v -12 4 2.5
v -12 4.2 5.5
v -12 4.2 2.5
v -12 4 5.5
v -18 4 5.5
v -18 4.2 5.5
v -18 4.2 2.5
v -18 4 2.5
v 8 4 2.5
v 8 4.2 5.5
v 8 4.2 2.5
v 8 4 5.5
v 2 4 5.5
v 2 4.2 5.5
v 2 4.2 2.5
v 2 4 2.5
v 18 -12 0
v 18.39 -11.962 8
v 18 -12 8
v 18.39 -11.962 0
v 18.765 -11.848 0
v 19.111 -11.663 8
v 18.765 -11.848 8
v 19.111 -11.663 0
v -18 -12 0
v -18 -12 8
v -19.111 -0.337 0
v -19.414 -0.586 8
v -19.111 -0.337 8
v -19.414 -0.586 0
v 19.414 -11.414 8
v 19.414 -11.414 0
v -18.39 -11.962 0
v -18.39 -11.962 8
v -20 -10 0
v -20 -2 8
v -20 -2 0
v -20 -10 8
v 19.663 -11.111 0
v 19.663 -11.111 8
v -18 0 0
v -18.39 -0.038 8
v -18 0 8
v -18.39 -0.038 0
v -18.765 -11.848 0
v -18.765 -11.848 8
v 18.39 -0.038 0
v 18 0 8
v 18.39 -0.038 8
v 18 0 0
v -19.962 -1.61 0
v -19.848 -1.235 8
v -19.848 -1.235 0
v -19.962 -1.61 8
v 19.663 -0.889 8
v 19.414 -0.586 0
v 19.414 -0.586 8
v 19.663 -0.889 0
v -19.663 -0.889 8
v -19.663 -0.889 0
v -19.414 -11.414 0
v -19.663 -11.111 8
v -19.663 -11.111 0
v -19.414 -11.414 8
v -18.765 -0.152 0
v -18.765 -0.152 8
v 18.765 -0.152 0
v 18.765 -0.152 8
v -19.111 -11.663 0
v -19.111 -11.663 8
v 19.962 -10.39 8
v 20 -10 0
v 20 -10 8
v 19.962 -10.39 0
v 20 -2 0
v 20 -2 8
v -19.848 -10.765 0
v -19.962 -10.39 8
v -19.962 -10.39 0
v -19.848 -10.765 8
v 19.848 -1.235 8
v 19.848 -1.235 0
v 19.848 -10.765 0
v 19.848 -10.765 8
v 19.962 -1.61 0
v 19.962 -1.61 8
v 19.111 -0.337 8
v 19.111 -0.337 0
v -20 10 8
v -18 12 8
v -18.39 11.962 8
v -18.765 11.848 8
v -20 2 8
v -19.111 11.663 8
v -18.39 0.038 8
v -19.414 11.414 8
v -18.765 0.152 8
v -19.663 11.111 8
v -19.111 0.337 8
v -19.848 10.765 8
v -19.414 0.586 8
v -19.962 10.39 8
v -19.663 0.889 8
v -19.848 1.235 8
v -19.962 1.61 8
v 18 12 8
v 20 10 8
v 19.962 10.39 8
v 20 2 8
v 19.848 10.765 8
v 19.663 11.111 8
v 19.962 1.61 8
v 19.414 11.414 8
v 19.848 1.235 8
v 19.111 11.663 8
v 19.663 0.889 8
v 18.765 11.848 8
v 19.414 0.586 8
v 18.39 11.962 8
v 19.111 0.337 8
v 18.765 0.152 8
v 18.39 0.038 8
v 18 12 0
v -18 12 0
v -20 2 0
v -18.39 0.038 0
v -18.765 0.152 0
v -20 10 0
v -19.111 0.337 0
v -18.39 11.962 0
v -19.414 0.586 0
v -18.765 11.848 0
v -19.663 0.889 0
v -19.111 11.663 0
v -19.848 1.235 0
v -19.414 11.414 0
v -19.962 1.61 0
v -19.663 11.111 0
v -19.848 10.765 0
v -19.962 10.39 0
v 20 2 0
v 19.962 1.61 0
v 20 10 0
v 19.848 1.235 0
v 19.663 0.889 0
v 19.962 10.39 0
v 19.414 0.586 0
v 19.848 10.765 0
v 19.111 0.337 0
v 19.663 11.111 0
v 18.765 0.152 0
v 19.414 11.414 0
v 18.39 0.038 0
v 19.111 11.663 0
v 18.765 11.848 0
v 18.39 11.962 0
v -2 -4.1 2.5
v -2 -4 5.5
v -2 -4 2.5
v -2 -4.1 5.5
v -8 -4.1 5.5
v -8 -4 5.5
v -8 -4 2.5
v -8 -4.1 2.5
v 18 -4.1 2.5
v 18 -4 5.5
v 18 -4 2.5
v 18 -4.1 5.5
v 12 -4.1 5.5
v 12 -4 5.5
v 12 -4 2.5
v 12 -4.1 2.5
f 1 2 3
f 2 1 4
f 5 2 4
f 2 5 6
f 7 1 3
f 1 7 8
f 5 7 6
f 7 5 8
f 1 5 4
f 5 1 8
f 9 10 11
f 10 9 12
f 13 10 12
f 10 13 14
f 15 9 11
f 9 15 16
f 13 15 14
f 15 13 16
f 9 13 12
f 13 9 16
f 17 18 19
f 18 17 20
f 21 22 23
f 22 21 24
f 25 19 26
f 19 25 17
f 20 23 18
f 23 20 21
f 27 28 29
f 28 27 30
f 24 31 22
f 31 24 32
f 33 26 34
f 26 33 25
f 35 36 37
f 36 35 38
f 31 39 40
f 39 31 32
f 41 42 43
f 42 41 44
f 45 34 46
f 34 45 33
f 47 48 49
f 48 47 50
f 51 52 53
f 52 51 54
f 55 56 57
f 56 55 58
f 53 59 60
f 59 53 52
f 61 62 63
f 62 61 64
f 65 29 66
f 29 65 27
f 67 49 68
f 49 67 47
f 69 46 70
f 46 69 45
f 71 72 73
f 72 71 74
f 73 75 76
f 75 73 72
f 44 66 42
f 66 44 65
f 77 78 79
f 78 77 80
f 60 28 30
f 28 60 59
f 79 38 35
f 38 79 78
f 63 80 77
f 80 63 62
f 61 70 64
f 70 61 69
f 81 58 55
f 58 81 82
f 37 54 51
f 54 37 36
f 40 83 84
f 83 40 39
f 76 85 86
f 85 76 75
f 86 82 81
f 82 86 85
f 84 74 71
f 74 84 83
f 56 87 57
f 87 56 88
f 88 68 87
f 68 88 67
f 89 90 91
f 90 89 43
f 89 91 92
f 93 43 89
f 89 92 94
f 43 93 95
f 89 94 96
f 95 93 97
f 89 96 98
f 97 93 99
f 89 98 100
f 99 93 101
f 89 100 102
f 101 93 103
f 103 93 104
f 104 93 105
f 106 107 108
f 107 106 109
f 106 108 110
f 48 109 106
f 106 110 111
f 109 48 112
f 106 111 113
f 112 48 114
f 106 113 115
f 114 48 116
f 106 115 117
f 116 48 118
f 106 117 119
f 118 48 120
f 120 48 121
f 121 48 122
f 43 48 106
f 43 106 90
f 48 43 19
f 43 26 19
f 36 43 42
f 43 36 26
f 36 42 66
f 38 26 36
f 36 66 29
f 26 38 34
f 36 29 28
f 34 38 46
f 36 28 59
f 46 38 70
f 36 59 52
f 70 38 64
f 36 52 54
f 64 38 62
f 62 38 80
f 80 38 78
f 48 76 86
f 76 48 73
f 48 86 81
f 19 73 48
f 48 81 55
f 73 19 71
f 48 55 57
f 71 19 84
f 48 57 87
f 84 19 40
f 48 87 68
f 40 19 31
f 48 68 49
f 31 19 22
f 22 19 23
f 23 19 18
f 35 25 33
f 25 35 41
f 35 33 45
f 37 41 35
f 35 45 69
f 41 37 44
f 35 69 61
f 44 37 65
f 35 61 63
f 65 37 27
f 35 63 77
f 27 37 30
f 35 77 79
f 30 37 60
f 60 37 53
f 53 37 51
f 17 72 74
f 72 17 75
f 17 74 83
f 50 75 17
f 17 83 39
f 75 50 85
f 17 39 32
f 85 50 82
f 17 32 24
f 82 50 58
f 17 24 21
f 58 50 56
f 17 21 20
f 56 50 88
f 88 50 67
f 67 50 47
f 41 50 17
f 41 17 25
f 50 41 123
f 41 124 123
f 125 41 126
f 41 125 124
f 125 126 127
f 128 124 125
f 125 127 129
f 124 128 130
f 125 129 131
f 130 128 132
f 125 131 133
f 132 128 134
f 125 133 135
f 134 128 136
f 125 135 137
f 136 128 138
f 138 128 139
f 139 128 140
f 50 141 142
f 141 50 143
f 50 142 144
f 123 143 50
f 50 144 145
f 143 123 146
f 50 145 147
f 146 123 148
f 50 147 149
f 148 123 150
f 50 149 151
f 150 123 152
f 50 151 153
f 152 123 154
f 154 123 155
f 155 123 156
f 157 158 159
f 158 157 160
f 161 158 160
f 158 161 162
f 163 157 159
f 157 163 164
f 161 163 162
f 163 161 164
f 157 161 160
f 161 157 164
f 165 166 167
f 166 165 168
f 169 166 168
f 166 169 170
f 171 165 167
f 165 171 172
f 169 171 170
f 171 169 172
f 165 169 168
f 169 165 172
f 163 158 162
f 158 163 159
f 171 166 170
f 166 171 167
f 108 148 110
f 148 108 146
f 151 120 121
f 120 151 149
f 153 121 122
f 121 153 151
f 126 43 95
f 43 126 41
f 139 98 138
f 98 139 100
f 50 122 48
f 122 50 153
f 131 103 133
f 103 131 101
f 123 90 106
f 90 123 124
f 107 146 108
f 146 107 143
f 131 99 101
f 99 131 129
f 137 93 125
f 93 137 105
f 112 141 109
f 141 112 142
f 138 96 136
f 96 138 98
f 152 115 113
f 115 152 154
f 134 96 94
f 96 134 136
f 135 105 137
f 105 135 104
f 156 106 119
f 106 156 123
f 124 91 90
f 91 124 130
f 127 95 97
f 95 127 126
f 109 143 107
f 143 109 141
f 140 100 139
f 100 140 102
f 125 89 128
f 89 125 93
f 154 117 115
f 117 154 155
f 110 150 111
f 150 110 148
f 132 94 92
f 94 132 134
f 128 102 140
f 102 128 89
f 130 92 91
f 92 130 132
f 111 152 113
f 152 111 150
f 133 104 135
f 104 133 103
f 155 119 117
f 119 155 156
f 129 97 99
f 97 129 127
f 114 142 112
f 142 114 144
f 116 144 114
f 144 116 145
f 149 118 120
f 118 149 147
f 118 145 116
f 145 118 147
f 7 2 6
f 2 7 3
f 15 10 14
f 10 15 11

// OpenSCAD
// file: ../source/rm_common.scad
// RobotMind: solid, double-sided panels with one blind mounting interface
// and hermaphrodite battlement edges. All dimensions are millimetres.
$fn = 32;

RM_EPS = 0.1;
RM_UNIT = 40;
RM_GRID = 10;
RM_EDGE_MARGIN = RM_GRID/2;
RM_PANEL_T = 8;
RM_CORNER_R = 3;
RM_FIT = 0; // positive is looser; tune in 0.05 mm steps

// One hexagonal blind port. The hexagonal ring accepts a tool-free peg; the
// circular centre boss accepts an optional M3 screw without piercing the
// opposite face.
RM_PORT_OD = 8;
RM_PORT_BOSS_D = 5;
RM_PORT_DEPTH = 2.2;
RM_PORT_PILOT_D = 2.7;
RM_PORT_PILOT_DEPTH = 3;
RM_PEG_ENTRY = 0.2;
RM_PEG_GRIP = 0.2;
RM_PEG_INNER_CLEARANCE = 0.3;

RM_M3_CLEARANCE = 3.4;
RM_M3_HEAD_D = 6.2;
RM_M3_HEAD_DEPTH = 2;

// Hermaphrodite battlement edge. Every panel is identical and point
// symmetric: north and west edges lead with a tab, south and east with a
// socket, so any edge mates any neighbouring edge with no connector parts.
// Flips are always allowed; 90-degree in-plane twists are not.
RM_TAB_W = 6;     // feature width along the edge
RM_TAB_T = 3;     // feature thickness, centred in the panel
RM_TAB_PROUD = 4; // tab protrusion == socket depth

function rm_tab_w() = RM_TAB_W-2*RM_FIT;
function rm_socket_w() = RM_TAB_W+2*RM_FIT;
function rm_port_od() = RM_PORT_OD+2*RM_FIT;
function rm_port_boss_d() = RM_PORT_BOSS_D-2*RM_FIT;
function rm_pilot_d() = RM_PORT_PILOT_D+2*RM_FIT;
function rm_peg_root_od(delta=0) = RM_PORT_OD+RM_PEG_GRIP-2*RM_FIT+delta;
function rm_peg_tip_od(delta=0) = RM_PORT_OD-RM_PEG_ENTRY-2*RM_FIT+delta;
function rm_peg_id() = RM_PORT_BOSS_D+RM_PEG_INNER_CLEARANCE+2*RM_FIT;

function grid_count(span) = floor((span-2*RM_EDGE_MARGIN)/RM_GRID)+1;
function grid_position(i,span) = -span/2+RM_EDGE_MARGIN+i*RM_GRID;

assert(RM_UNIT%RM_GRID == 0, "The unit must contain a whole mounting grid");
assert(grid_count(RM_UNIT) == 4,
       "The 40 mm unit must expose a 4x4 port grid");
assert(RM_PANEL_T > 2*RM_PORT_PILOT_DEPTH,
       "Blind pilots need a continuous membrane");
assert(rm_peg_root_od() > rm_port_od() &&
       rm_port_od() > rm_peg_tip_od(),
       "RM_FIT is outside the hexagonal peg range");
assert(rm_peg_id() > rm_port_boss_d() &&
       rm_port_boss_d() > rm_pilot_d(),
       "The port boss must separate peg and screw fits");
assert(RM_GRID-RM_PORT_OD > 1,
       "Mounting ports need enough material between them");
assert(RM_PANEL_T-RM_TAB_T >= 4, "Battlements need 2 mm skins");
assert(RM_TAB_W < RM_GRID, "Battlements must clear each other and corners");

module rounded_box(size=[20,20,3], r=2) {
  linear_extrude(height=size[2])
    offset(r=r) offset(delta=-r) square([size[0],size[1]]);
}

module rounded_panel(size=[RM_UNIT,RM_UNIT], t=RM_PANEL_T,
                     r=RM_CORNER_R) {
  translate([-size[0]/2,-size[1]/2,0]) rounded_box([size[0],size[1],t],r);
}

// Cut from a face at Z=0 into material extending in +Z.
module blind_port_cut(depth=RM_PORT_DEPTH,
                      pilot_d=rm_pilot_d(),
                      pilot_depth=RM_PORT_PILOT_DEPTH) {
  union() {
    difference() {
      translate([0,0,-RM_EPS])
        cylinder(h=depth+RM_EPS,d=rm_port_od(),$fn=6);
      translate([0,0,-2*RM_EPS])
        cylinder(h=depth+3*RM_EPS,d=rm_port_boss_d());
    }
    translate([0,0,-RM_EPS])
      cylinder(h=pilot_depth+RM_EPS,d=pilot_d);
  }
}

module face_port_cuts(size=[RM_UNIT,RM_UNIT], top=false) {
  for(ix=[0:grid_count(size[0])-1], iy=[0:grid_count(size[1])-1]) {
    p=[grid_position(ix,size[0]),grid_position(iy,size[1])];
    if(top)
      translate([p[0],p[1],RM_PANEL_T]) mirror([0,0,1]) blind_port_cut();
    else
      translate([p[0],p[1],0]) blind_port_cut();
  }
}

module panel(size=[RM_UNIT,RM_UNIT]) {
  assert(size[0]%RM_UNIT == 0 && size[1]%RM_UNIT == 0,
         "Panel dimensions must be whole 40 mm units");
  hw=size[0]/2;
  hh=size[1]/2;
  difference() {
    union() {
      rounded_panel(size);
      edge_tabs_x(size[0], hh, 1, 0);   // north leads with a tab
      edge_tabs_x(size[0], -hh, -1, 1); // south leads with a socket
      edge_tabs_y(size[1], hw, 1, 1);   // east leads with a socket
      edge_tabs_y(size[1], -hw, -1, 0); // west leads with a tab
    }
    edge_sockets_x(size[0], hh, 1, 0);   // north sockets at odd lines
    edge_sockets_x(size[0], -hh, -1, 1); // south sockets at even lines
    edge_sockets_y(size[1], hw, 1, 1);   // east sockets at even lines
    edge_sockets_y(size[1], -hw, -1, 0); // west sockets at odd lines
    face_port_cuts(size);
    face_port_cuts(size,true);
  }
}

// Every carrier reuses this exact integral hexagonal peg.
module mount_peg(delta=0, h=RM_PORT_DEPTH) {
  difference() {
    cylinder(h=h,
             d1=rm_peg_root_od(delta),d2=rm_peg_tip_od(delta),$fn=6);
    translate([0,0,-RM_EPS])
      cylinder(h=h+2*RM_EPS,d=rm_peg_id());
  }
}

// Cut from an exposed surface at Z=0 into material extending in +Z.
module optional_screw_cut(depth=RM_PANEL_T) {
  translate([0,0,-RM_EPS])
    cylinder(h=depth+2*RM_EPS,d=RM_M3_CLEARANCE);
  translate([0,0,-RM_EPS])
    cylinder(h=RM_M3_HEAD_DEPTH+RM_EPS,d=RM_M3_HEAD_D);
}

// Battlement primitives. phase 0 puts tabs on even grid indices, phase 1 on
// odd indices. Edges running along X sit at y=y0 and open toward sy; edges
// along Y sit at x=x0 and open toward sx.
// Tabs are solids added to the panel; sockets are blind recesses cut into
// the same edge at the opposite parity. A socket always opens at the edge
// face (y0) and reaches INTO the panel body, i.e. in the -sy direction for
// an edge whose features point +sy.
module _tab(x, y0, sy) {
  translate([x-RM_TAB_W/2,
             sy>0 ? y0 : y0-RM_TAB_PROUD,
             (RM_PANEL_T-RM_TAB_T)/2])
    cube([RM_TAB_W,RM_TAB_PROUD,RM_TAB_T]);
}

module _socket(x, y0, sy) {
  translate([x-rm_socket_w()/2,
             sy>0 ? y0-RM_TAB_PROUD-RM_EPS : y0,
             (RM_PANEL_T-RM_TAB_T)/2])
    cube([rm_socket_w(),RM_TAB_PROUD+2*RM_EPS,RM_TAB_T]);
}

module edge_tabs_x(length, y0, sy, phase) {
  for(i=[0:grid_count(length)-1])
    if(i%2 == phase)
      _tab(grid_position(i,length),y0,sy);
}

module edge_sockets_x(length, y0, sy, phase) {
  for(i=[0:grid_count(length)-1])
    if(i%2 != phase)
      _socket(grid_position(i,length),y0,sy);
}

module edge_tabs_y(length, x0, sx, phase) {
  for(i=[0:grid_count(length)-1])
    if(i%2 == phase)
      translate([sx>0 ? x0 : x0-RM_TAB_PROUD,
                 grid_position(i,length)-RM_TAB_W/2,
                 (RM_PANEL_T-RM_TAB_T)/2])
        cube([RM_TAB_PROUD,RM_TAB_W,RM_TAB_T]);
}

module edge_sockets_y(length, x0, sx, phase) {
  for(i=[0:grid_count(length)-1])
    if(i%2 != phase)
      translate([sx>0 ? x0-RM_TAB_PROUD-RM_EPS : x0-RM_EPS,
                 grid_position(i,length)-rm_socket_w()/2,
                 (RM_PANEL_T-RM_TAB_T)/2])
        cube([RM_TAB_PROUD+2*RM_EPS,rm_socket_w(),RM_TAB_T]);
}
// main file
include <../source/rm_common.scad>

// 90-degree fold probe. Two battlement leaves own the seam a real panel
// pair yields; a thin hinge web ties them low on the seam so the pair
// stays one part and folds about the seam axis.
//
// Flat, the leaves interleave exactly as a panel seam should: leaf A
// leads tabs on even grid lines, leaf B leads tabs on odd lines, so tabs
// enter sockets across the whole edge.
//
// Fold the leaves up about the hinge to 90 and press them together:
// either the teeth engage and the fold holds on its own, or they slip and
// a corner needs a part.

module leaf(sy, phase) {
  difference() {
    union() {
      translate([-20, sy>0 ? -12 : 0, 0]) rounded_box([40, 12, RM_PANEL_T], 2);
      edge_tabs_x(RM_UNIT, 0, sy, phase);
    }
    edge_sockets_x(RM_UNIT, 0, sy, phase);
  }
}

module corner_coupon() {
  leaf(+1, 0);  // A: phase 0, teeth +y
  leaf(-1, 1);  // B: phase 1, teeth -y
  // Hinge web: short central band across the seam, fused into both leaves
  // below the teeth. The free ends let the teeth interact while the web
  // keeps the pair one part; bending it to 90 is the test.
  translate([-10, -0.5, 0]) cube([20, 1.0, 1.2]);
}

corner_coupon();
